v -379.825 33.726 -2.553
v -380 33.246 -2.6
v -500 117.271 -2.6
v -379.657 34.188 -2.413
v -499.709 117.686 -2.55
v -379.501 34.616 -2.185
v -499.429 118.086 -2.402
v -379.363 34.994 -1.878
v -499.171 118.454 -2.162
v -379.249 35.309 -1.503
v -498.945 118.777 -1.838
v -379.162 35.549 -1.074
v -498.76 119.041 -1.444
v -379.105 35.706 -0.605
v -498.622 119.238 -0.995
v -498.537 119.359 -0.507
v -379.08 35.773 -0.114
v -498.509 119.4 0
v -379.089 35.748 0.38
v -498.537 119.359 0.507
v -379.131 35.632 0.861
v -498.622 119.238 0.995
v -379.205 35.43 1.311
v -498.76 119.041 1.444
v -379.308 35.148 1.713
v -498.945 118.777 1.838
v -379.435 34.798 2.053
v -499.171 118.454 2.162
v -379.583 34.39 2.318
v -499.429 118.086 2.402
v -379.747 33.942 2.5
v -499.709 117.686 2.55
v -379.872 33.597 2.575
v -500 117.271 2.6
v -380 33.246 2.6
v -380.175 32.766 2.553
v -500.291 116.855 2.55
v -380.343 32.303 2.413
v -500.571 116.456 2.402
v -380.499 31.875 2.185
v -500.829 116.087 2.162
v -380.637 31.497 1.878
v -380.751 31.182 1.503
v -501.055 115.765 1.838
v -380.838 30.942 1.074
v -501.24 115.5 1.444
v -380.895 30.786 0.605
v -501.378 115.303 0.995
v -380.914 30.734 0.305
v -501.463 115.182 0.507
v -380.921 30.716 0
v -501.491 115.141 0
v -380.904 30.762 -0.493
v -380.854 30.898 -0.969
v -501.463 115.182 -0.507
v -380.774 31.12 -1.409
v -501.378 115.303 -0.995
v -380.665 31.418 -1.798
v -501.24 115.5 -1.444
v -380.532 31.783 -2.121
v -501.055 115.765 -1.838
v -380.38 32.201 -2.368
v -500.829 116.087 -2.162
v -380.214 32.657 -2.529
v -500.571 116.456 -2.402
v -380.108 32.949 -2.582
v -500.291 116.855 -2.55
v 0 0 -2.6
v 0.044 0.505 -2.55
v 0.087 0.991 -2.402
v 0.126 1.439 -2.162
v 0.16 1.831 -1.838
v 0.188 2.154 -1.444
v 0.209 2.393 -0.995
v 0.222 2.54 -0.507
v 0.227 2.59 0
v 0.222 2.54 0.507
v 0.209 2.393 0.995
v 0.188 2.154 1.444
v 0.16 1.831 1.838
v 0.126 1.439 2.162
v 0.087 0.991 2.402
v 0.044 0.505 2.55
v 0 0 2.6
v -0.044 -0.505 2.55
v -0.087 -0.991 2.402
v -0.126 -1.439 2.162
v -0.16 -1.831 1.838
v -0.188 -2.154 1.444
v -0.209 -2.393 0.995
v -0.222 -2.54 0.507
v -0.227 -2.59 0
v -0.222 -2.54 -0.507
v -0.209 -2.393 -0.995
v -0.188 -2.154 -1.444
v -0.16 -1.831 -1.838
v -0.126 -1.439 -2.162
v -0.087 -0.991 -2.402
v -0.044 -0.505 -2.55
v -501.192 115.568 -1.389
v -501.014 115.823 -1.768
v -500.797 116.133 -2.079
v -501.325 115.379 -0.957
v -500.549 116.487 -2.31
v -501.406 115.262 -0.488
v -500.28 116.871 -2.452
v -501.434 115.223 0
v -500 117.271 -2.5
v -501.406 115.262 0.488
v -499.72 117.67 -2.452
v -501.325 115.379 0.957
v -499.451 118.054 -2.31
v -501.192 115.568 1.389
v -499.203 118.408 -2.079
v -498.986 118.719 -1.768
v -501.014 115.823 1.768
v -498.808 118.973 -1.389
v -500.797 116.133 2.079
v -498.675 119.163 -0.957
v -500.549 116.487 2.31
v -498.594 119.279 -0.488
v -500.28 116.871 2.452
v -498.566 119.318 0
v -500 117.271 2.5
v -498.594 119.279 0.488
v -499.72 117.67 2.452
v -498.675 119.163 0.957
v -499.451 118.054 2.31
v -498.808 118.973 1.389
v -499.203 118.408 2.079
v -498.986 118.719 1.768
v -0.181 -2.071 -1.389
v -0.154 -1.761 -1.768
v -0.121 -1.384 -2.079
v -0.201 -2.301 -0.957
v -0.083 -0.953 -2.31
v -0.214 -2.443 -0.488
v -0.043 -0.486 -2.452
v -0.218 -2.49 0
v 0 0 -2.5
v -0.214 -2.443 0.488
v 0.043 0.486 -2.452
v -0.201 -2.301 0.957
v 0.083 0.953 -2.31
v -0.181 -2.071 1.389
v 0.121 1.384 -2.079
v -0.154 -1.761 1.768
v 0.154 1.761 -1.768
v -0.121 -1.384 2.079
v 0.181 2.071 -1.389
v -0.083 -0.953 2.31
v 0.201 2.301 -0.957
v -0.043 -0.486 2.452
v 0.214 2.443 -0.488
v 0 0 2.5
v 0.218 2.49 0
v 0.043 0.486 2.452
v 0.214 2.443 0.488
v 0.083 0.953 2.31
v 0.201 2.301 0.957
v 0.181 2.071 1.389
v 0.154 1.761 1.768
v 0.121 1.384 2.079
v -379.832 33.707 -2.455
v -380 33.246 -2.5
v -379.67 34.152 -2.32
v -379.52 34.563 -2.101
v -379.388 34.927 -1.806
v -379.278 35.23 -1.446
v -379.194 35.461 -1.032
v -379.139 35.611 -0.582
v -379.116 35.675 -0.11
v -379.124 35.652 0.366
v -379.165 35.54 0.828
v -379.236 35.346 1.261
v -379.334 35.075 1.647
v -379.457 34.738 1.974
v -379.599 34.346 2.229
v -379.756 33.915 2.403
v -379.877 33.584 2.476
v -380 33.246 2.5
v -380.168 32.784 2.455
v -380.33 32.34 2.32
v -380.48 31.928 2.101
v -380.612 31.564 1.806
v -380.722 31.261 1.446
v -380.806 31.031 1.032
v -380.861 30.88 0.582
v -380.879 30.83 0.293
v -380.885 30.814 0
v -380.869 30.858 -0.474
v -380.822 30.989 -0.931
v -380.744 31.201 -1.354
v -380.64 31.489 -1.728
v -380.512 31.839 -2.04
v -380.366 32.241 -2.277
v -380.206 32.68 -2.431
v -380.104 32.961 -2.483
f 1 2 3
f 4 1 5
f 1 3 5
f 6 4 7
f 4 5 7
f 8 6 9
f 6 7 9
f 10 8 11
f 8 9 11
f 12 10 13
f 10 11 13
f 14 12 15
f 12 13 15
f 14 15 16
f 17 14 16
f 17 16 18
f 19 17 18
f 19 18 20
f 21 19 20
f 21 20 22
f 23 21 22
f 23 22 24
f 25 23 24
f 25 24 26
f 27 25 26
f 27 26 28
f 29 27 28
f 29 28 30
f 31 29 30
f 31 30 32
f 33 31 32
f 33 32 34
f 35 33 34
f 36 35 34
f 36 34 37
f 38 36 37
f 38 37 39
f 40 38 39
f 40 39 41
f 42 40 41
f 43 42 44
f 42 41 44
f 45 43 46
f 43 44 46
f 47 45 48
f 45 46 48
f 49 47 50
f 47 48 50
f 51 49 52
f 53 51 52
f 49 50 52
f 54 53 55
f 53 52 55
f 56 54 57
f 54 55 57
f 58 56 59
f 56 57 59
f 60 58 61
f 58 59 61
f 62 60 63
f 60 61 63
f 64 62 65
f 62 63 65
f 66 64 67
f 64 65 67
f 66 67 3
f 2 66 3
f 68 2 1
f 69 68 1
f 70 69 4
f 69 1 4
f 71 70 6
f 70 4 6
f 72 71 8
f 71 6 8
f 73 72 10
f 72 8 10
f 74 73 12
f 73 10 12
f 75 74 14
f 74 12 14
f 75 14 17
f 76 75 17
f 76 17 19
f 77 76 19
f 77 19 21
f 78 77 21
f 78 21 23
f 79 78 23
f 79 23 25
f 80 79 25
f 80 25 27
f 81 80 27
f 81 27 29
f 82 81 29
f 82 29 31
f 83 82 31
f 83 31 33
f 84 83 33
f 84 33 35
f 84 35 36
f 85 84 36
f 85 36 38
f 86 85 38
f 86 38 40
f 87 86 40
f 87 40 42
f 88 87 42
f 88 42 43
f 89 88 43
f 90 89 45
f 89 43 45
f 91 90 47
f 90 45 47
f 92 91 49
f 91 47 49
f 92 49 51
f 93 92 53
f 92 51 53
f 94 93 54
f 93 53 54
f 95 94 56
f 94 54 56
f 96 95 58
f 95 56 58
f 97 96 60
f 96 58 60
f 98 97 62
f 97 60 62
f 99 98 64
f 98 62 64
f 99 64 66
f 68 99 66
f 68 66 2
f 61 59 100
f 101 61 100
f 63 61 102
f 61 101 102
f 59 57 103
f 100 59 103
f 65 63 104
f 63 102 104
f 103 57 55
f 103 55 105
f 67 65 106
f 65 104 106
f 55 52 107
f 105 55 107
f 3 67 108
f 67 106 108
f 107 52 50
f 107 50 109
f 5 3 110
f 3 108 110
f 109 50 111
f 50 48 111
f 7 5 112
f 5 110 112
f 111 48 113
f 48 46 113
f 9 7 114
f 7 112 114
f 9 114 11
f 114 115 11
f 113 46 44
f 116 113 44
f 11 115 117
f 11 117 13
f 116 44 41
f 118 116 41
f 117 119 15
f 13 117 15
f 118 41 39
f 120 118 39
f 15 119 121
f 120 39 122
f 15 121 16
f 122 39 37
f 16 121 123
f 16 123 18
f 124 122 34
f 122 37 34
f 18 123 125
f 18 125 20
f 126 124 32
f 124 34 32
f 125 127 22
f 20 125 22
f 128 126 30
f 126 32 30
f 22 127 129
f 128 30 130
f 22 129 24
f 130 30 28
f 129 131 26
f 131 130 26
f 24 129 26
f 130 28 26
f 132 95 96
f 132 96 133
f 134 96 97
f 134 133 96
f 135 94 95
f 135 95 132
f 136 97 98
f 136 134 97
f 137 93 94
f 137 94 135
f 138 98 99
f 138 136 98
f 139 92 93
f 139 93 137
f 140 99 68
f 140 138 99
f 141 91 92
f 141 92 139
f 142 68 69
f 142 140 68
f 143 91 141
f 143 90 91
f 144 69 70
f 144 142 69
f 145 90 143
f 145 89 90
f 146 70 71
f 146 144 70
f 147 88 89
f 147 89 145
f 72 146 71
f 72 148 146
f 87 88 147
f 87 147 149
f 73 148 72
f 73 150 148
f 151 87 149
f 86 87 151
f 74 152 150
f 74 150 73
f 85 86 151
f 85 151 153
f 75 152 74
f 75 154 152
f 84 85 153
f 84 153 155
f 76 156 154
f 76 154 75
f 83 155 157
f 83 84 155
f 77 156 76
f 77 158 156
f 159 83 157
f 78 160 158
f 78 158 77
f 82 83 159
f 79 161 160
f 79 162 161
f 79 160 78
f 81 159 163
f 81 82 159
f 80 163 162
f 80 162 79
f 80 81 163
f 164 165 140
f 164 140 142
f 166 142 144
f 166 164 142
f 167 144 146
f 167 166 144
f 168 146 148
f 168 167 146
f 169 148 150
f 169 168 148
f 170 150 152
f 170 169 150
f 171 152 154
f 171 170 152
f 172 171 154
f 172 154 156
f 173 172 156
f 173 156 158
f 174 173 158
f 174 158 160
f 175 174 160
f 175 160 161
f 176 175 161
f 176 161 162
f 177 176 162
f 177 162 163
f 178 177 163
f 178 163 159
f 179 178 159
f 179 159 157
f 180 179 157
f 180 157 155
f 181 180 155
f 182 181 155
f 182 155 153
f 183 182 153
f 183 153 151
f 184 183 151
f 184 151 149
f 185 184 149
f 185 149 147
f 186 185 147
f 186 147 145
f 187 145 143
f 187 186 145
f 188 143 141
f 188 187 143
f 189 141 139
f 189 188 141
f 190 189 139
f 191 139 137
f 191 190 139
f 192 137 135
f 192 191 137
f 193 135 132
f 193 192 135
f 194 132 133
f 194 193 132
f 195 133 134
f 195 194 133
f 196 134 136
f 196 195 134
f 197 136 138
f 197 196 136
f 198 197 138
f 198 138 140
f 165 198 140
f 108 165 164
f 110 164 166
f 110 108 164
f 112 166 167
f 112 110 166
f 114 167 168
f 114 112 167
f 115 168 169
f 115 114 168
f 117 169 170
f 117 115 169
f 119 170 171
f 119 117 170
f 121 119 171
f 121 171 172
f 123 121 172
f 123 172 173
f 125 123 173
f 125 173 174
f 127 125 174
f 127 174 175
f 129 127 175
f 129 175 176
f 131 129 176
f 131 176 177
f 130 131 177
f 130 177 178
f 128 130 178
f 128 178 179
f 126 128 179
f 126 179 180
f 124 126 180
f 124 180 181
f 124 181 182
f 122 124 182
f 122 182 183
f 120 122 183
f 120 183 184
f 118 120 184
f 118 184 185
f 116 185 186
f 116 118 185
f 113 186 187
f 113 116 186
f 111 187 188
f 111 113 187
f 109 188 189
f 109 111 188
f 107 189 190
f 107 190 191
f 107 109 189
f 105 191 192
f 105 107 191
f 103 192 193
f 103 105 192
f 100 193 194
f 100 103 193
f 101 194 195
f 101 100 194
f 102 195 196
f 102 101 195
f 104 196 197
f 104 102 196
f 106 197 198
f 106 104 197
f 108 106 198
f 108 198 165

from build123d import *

# Parameters (mm, degrees)
SKETCH3_R   = 2.6
SKETCH3_R_2 = 2.5


with BuildPart() as part:
    # Sweep-Thin1: sweep along a path in Sketch2
    with BuildLine(Plane.XY) as sweep_thin1_path:
        Line((0, 0), (380, 33.24569214))
        Line((380, 33.24569214), (500, 117.270596725))
    # Sketch3 → Sweep-Thin1 (sweep)
    with BuildSketch(Plane(origin=(0, 0, 0), x_dir=(0, 0, -1), z_dir=(0.996194698, 0.087155743, 0))):
        Circle(SKETCH3_R)
        Circle(SKETCH3_R_2, mode=Mode.SUBTRACT)
    sweep(path=sweep_thin1_path.line, transition=Transition.RIGHT)


with BuildPart() as body_2:
    # Mirror1: mirrored copy
    add(part.part.mirror(Plane(origin=(0, 0, 0), x_dir=(0, 0, 1), z_dir=(1, 0, 0))))


solid = body_2.part
